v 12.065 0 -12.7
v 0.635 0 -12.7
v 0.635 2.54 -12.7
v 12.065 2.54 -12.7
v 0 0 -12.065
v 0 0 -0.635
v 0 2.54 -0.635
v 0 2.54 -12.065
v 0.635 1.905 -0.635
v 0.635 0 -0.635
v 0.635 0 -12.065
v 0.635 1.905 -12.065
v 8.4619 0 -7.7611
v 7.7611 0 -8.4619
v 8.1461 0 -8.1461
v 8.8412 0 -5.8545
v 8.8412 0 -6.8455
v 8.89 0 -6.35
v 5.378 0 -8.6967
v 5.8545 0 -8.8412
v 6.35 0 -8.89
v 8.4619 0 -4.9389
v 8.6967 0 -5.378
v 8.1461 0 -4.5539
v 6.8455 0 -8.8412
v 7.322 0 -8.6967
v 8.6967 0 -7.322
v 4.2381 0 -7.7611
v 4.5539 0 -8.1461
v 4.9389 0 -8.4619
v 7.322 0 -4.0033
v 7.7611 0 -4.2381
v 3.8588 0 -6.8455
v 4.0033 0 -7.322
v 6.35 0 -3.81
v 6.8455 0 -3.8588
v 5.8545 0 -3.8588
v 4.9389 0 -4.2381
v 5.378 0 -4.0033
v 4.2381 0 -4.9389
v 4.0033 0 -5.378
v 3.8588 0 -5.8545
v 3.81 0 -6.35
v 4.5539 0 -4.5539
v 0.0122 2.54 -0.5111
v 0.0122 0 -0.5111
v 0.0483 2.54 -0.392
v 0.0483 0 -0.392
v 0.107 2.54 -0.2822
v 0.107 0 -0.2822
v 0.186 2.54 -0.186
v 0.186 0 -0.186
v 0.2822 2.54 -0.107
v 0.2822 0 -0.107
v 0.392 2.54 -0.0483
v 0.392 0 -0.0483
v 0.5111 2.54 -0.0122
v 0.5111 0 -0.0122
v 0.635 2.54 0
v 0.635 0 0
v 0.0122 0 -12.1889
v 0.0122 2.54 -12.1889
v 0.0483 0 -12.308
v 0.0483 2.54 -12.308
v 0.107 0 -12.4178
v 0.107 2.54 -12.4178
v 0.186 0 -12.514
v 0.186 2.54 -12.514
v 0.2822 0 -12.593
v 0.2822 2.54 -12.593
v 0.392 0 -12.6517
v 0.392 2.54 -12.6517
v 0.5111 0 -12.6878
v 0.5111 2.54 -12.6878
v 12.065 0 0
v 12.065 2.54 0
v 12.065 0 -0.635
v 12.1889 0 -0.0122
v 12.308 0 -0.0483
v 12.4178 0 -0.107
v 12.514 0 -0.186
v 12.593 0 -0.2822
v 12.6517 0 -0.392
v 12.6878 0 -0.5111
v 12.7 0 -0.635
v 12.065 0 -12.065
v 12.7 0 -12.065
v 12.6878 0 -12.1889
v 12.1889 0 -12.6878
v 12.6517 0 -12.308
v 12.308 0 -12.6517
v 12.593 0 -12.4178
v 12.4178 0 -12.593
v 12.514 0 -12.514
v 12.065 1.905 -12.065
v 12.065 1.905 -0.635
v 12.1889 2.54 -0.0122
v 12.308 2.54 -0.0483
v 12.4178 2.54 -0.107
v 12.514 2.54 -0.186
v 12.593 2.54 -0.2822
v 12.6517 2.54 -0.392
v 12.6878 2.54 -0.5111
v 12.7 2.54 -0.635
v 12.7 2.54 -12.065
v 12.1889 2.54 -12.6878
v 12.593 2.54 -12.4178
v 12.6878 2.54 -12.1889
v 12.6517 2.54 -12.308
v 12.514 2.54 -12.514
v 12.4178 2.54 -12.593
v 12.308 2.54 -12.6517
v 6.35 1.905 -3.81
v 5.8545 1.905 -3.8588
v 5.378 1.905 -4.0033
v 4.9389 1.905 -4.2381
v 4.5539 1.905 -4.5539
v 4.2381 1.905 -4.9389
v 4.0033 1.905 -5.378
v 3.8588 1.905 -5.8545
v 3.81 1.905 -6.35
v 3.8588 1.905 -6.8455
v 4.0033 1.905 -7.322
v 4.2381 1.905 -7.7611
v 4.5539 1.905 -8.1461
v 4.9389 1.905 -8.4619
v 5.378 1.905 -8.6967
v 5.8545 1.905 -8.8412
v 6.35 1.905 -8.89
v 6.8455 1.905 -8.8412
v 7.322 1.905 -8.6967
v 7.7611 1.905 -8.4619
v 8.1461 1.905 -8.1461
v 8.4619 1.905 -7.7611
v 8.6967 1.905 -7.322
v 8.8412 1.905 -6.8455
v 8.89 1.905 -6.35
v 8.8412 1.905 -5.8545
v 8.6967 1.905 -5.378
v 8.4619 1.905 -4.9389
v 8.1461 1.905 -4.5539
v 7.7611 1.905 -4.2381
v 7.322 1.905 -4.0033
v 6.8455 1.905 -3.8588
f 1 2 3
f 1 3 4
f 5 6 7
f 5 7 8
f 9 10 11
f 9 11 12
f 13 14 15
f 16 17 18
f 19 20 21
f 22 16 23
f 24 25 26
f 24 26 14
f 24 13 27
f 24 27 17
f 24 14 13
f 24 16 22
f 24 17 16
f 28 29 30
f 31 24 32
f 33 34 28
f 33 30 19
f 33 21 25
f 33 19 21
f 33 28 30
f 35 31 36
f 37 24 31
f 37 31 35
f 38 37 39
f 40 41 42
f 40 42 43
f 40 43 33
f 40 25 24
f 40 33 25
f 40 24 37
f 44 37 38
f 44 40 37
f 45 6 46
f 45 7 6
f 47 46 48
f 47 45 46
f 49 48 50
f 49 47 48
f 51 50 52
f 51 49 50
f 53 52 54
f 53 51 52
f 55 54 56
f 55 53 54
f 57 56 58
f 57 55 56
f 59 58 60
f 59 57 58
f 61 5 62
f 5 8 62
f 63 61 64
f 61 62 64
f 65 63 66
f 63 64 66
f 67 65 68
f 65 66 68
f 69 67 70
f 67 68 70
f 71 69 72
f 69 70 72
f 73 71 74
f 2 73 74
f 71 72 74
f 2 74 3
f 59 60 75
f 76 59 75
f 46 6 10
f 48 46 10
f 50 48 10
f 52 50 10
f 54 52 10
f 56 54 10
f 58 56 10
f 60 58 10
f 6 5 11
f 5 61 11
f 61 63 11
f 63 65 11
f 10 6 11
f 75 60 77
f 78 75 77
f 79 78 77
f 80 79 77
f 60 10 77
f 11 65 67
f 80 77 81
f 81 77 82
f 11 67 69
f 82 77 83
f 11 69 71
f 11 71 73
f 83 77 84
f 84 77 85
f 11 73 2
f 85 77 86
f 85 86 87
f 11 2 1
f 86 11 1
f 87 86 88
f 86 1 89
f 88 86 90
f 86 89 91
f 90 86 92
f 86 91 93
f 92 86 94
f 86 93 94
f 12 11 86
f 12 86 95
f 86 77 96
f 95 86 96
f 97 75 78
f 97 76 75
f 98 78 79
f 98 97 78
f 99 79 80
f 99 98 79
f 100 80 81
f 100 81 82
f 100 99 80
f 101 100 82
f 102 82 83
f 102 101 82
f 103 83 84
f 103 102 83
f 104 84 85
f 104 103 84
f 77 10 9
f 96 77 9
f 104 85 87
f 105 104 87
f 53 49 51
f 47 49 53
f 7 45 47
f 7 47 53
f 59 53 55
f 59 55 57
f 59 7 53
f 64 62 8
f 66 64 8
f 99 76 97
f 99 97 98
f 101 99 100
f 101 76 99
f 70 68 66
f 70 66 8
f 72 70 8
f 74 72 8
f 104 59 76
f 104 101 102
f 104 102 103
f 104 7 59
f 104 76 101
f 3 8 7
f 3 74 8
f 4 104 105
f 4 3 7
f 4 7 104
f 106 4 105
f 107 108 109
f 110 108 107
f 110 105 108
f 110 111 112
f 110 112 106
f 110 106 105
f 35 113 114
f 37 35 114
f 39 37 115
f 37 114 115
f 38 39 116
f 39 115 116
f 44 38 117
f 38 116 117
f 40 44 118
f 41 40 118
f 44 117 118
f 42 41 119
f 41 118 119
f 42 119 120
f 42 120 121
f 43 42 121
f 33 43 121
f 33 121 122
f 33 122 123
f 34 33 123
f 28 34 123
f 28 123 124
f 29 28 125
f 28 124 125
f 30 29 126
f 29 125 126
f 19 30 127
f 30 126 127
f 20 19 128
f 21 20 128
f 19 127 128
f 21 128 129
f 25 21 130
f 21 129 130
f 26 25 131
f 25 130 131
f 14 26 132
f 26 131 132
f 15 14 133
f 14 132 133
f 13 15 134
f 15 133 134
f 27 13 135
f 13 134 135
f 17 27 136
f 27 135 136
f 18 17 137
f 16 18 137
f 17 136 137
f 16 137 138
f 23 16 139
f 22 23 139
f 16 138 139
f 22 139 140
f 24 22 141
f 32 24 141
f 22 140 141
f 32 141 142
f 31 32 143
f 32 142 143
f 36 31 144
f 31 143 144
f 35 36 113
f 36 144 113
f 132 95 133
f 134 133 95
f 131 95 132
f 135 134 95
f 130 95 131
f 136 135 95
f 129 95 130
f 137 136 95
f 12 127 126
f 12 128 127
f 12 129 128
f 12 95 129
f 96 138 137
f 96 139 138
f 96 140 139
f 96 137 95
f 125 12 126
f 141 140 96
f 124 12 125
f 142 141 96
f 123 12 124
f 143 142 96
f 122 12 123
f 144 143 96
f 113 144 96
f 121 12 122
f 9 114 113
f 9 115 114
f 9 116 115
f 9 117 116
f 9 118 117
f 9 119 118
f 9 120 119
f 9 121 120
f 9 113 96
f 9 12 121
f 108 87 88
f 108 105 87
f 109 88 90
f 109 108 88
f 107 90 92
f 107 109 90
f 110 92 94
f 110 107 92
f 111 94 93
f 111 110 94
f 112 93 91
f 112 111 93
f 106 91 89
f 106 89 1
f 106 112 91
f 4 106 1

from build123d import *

# Parameters (mm, degrees)
SKETCH1_W           = 12.7
SKETCH1_H           = 12.7
BOSS_EXTRUDE1_DEPTH = 2.54
FILLET1_R           = 0.635
SHELL1_START        = 0.635
SHELL1_OUTLINE_W    = 1.905
SHELL1_OUTLINE_H    = 11.43
SHELL1_DEPTH        = 11.43
SKETCH2_R           = 2.54
BOSS_EXTRUDE2_DEPTH = 1.905


# Read off the part's stored shape, not the designer's step: Shell1
with BuildPart() as part:
    # Sketch1 → Boss-Extrude1 (new body)
    with BuildSketch(Plane(origin=(0, 0, 0), x_dir=(1, 0, 0), z_dir=(0, 1, 0))):
        with Locations((6.35, 6.35)):
            Rectangle(SKETCH1_W, SKETCH1_H)
    extrude(amount=BOSS_EXTRUDE1_DEPTH)

    # Fillet1
    fillet1_edges = [part.edges().sort_by_distance(p)[0] for p in [
        (0, 1.27, -12.7),
        (12.7, 1.27, -12.7),
        (12.7, 1.27, 0),
        (0, 1.27, 0),
    ]]
    fillet(fillet1_edges, radius=FILLET1_R)

    # Shell1 outline → Shell1 (cut)
    with BuildSketch(Plane.YZ.offset(SHELL1_START)):
        with Locations((0.9525, -6.35)):
            Rectangle(SHELL1_OUTLINE_W, SHELL1_OUTLINE_H)
    extrude(amount=SHELL1_DEPTH, mode=Mode.SUBTRACT)

    # Sketch2 → Boss-Extrude2 (add)
    with BuildSketch(Plane(origin=(0, 1.905, 0), x_dir=(-1, 0, 0), z_dir=(0, -1, 0))):
        with Locations(Location((-6.35, 6.35, 0), (0, 0, 270))):
            Circle(SKETCH2_R)
    extrude(amount=BOSS_EXTRUDE2_DEPTH)


solid = part.part
